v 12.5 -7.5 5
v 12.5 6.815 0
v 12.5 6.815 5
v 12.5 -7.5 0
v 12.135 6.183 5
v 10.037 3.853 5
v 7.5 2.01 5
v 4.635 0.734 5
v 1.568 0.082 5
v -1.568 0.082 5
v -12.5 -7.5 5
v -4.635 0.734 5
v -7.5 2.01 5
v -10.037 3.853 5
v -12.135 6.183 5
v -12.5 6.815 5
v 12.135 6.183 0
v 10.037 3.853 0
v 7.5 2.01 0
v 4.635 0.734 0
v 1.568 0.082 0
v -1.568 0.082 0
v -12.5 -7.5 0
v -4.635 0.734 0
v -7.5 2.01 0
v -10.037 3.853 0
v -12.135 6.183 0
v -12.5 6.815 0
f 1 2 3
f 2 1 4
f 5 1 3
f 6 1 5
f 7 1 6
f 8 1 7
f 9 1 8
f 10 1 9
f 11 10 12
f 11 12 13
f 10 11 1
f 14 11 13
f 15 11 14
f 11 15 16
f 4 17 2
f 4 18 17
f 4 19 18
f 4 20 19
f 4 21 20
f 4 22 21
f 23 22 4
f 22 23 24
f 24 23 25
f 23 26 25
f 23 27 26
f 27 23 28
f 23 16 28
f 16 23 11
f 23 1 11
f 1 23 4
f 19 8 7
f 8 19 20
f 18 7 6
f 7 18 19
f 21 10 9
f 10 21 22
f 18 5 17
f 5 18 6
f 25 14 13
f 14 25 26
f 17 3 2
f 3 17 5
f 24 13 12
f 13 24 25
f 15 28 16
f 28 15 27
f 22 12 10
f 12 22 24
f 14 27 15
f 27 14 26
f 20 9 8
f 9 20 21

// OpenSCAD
// file: common.scad
module arrow() {
    union() {
        translate([-3,-1.5,0]) cube([4,3,0.5]);
        translate([2.5,0,0]) cylinder(0.5,3,3,$fn=3);
    }
}

module _wave_s() {
    difference() {
        translate([0,2.5,0]) cylinder(0.5,3,3);
        translate([0,2,-10]) cylinder(30,3,3);
    }
    translate([6,0,0]) difference() {
        translate([0,2,0]) cylinder(0.5,3,3);
        translate([0,2.5,-10]) cylinder(30,3,3);
    }
}

module wave() {
    $wave_scale = 0.75;
    scale([$wave_scale, $wave_scale, 1]) translate([0,-2,0]) {
        difference() {
            translate([9,0,0]) _wave_s();
            translate([15,-3,-1]) cube([6,10,2.5]);
        }
        translate([-3,0,0]) _wave_s();
        difference() {
            translate([-15,0,0]) _wave_s();
            translate([-21.5,-3,-1]) cube([6,10,2.5]);
        }
        
        mirror([-1,0,0]) {
            difference() {
                translate([9,0,0]) _wave_s();
                translate([15.75,-3,-1]) cube([6,10,2.5]);
            }
            translate([-3,0,0]) _wave_s();
            difference() {
                translate([-15,0,0]) _wave_s();
                translate([-20.75,-3,-1]) cube([6,10,2.5]);
            }
        }
    }
}
// main file
include <common.scad>;

color([0,0.75,1]) difference() {
translate([-12.5,-7.5,0]) cube([25,15,5]);
translate([0,15,-0.5]) cylinder(6,15,15,false);
}
